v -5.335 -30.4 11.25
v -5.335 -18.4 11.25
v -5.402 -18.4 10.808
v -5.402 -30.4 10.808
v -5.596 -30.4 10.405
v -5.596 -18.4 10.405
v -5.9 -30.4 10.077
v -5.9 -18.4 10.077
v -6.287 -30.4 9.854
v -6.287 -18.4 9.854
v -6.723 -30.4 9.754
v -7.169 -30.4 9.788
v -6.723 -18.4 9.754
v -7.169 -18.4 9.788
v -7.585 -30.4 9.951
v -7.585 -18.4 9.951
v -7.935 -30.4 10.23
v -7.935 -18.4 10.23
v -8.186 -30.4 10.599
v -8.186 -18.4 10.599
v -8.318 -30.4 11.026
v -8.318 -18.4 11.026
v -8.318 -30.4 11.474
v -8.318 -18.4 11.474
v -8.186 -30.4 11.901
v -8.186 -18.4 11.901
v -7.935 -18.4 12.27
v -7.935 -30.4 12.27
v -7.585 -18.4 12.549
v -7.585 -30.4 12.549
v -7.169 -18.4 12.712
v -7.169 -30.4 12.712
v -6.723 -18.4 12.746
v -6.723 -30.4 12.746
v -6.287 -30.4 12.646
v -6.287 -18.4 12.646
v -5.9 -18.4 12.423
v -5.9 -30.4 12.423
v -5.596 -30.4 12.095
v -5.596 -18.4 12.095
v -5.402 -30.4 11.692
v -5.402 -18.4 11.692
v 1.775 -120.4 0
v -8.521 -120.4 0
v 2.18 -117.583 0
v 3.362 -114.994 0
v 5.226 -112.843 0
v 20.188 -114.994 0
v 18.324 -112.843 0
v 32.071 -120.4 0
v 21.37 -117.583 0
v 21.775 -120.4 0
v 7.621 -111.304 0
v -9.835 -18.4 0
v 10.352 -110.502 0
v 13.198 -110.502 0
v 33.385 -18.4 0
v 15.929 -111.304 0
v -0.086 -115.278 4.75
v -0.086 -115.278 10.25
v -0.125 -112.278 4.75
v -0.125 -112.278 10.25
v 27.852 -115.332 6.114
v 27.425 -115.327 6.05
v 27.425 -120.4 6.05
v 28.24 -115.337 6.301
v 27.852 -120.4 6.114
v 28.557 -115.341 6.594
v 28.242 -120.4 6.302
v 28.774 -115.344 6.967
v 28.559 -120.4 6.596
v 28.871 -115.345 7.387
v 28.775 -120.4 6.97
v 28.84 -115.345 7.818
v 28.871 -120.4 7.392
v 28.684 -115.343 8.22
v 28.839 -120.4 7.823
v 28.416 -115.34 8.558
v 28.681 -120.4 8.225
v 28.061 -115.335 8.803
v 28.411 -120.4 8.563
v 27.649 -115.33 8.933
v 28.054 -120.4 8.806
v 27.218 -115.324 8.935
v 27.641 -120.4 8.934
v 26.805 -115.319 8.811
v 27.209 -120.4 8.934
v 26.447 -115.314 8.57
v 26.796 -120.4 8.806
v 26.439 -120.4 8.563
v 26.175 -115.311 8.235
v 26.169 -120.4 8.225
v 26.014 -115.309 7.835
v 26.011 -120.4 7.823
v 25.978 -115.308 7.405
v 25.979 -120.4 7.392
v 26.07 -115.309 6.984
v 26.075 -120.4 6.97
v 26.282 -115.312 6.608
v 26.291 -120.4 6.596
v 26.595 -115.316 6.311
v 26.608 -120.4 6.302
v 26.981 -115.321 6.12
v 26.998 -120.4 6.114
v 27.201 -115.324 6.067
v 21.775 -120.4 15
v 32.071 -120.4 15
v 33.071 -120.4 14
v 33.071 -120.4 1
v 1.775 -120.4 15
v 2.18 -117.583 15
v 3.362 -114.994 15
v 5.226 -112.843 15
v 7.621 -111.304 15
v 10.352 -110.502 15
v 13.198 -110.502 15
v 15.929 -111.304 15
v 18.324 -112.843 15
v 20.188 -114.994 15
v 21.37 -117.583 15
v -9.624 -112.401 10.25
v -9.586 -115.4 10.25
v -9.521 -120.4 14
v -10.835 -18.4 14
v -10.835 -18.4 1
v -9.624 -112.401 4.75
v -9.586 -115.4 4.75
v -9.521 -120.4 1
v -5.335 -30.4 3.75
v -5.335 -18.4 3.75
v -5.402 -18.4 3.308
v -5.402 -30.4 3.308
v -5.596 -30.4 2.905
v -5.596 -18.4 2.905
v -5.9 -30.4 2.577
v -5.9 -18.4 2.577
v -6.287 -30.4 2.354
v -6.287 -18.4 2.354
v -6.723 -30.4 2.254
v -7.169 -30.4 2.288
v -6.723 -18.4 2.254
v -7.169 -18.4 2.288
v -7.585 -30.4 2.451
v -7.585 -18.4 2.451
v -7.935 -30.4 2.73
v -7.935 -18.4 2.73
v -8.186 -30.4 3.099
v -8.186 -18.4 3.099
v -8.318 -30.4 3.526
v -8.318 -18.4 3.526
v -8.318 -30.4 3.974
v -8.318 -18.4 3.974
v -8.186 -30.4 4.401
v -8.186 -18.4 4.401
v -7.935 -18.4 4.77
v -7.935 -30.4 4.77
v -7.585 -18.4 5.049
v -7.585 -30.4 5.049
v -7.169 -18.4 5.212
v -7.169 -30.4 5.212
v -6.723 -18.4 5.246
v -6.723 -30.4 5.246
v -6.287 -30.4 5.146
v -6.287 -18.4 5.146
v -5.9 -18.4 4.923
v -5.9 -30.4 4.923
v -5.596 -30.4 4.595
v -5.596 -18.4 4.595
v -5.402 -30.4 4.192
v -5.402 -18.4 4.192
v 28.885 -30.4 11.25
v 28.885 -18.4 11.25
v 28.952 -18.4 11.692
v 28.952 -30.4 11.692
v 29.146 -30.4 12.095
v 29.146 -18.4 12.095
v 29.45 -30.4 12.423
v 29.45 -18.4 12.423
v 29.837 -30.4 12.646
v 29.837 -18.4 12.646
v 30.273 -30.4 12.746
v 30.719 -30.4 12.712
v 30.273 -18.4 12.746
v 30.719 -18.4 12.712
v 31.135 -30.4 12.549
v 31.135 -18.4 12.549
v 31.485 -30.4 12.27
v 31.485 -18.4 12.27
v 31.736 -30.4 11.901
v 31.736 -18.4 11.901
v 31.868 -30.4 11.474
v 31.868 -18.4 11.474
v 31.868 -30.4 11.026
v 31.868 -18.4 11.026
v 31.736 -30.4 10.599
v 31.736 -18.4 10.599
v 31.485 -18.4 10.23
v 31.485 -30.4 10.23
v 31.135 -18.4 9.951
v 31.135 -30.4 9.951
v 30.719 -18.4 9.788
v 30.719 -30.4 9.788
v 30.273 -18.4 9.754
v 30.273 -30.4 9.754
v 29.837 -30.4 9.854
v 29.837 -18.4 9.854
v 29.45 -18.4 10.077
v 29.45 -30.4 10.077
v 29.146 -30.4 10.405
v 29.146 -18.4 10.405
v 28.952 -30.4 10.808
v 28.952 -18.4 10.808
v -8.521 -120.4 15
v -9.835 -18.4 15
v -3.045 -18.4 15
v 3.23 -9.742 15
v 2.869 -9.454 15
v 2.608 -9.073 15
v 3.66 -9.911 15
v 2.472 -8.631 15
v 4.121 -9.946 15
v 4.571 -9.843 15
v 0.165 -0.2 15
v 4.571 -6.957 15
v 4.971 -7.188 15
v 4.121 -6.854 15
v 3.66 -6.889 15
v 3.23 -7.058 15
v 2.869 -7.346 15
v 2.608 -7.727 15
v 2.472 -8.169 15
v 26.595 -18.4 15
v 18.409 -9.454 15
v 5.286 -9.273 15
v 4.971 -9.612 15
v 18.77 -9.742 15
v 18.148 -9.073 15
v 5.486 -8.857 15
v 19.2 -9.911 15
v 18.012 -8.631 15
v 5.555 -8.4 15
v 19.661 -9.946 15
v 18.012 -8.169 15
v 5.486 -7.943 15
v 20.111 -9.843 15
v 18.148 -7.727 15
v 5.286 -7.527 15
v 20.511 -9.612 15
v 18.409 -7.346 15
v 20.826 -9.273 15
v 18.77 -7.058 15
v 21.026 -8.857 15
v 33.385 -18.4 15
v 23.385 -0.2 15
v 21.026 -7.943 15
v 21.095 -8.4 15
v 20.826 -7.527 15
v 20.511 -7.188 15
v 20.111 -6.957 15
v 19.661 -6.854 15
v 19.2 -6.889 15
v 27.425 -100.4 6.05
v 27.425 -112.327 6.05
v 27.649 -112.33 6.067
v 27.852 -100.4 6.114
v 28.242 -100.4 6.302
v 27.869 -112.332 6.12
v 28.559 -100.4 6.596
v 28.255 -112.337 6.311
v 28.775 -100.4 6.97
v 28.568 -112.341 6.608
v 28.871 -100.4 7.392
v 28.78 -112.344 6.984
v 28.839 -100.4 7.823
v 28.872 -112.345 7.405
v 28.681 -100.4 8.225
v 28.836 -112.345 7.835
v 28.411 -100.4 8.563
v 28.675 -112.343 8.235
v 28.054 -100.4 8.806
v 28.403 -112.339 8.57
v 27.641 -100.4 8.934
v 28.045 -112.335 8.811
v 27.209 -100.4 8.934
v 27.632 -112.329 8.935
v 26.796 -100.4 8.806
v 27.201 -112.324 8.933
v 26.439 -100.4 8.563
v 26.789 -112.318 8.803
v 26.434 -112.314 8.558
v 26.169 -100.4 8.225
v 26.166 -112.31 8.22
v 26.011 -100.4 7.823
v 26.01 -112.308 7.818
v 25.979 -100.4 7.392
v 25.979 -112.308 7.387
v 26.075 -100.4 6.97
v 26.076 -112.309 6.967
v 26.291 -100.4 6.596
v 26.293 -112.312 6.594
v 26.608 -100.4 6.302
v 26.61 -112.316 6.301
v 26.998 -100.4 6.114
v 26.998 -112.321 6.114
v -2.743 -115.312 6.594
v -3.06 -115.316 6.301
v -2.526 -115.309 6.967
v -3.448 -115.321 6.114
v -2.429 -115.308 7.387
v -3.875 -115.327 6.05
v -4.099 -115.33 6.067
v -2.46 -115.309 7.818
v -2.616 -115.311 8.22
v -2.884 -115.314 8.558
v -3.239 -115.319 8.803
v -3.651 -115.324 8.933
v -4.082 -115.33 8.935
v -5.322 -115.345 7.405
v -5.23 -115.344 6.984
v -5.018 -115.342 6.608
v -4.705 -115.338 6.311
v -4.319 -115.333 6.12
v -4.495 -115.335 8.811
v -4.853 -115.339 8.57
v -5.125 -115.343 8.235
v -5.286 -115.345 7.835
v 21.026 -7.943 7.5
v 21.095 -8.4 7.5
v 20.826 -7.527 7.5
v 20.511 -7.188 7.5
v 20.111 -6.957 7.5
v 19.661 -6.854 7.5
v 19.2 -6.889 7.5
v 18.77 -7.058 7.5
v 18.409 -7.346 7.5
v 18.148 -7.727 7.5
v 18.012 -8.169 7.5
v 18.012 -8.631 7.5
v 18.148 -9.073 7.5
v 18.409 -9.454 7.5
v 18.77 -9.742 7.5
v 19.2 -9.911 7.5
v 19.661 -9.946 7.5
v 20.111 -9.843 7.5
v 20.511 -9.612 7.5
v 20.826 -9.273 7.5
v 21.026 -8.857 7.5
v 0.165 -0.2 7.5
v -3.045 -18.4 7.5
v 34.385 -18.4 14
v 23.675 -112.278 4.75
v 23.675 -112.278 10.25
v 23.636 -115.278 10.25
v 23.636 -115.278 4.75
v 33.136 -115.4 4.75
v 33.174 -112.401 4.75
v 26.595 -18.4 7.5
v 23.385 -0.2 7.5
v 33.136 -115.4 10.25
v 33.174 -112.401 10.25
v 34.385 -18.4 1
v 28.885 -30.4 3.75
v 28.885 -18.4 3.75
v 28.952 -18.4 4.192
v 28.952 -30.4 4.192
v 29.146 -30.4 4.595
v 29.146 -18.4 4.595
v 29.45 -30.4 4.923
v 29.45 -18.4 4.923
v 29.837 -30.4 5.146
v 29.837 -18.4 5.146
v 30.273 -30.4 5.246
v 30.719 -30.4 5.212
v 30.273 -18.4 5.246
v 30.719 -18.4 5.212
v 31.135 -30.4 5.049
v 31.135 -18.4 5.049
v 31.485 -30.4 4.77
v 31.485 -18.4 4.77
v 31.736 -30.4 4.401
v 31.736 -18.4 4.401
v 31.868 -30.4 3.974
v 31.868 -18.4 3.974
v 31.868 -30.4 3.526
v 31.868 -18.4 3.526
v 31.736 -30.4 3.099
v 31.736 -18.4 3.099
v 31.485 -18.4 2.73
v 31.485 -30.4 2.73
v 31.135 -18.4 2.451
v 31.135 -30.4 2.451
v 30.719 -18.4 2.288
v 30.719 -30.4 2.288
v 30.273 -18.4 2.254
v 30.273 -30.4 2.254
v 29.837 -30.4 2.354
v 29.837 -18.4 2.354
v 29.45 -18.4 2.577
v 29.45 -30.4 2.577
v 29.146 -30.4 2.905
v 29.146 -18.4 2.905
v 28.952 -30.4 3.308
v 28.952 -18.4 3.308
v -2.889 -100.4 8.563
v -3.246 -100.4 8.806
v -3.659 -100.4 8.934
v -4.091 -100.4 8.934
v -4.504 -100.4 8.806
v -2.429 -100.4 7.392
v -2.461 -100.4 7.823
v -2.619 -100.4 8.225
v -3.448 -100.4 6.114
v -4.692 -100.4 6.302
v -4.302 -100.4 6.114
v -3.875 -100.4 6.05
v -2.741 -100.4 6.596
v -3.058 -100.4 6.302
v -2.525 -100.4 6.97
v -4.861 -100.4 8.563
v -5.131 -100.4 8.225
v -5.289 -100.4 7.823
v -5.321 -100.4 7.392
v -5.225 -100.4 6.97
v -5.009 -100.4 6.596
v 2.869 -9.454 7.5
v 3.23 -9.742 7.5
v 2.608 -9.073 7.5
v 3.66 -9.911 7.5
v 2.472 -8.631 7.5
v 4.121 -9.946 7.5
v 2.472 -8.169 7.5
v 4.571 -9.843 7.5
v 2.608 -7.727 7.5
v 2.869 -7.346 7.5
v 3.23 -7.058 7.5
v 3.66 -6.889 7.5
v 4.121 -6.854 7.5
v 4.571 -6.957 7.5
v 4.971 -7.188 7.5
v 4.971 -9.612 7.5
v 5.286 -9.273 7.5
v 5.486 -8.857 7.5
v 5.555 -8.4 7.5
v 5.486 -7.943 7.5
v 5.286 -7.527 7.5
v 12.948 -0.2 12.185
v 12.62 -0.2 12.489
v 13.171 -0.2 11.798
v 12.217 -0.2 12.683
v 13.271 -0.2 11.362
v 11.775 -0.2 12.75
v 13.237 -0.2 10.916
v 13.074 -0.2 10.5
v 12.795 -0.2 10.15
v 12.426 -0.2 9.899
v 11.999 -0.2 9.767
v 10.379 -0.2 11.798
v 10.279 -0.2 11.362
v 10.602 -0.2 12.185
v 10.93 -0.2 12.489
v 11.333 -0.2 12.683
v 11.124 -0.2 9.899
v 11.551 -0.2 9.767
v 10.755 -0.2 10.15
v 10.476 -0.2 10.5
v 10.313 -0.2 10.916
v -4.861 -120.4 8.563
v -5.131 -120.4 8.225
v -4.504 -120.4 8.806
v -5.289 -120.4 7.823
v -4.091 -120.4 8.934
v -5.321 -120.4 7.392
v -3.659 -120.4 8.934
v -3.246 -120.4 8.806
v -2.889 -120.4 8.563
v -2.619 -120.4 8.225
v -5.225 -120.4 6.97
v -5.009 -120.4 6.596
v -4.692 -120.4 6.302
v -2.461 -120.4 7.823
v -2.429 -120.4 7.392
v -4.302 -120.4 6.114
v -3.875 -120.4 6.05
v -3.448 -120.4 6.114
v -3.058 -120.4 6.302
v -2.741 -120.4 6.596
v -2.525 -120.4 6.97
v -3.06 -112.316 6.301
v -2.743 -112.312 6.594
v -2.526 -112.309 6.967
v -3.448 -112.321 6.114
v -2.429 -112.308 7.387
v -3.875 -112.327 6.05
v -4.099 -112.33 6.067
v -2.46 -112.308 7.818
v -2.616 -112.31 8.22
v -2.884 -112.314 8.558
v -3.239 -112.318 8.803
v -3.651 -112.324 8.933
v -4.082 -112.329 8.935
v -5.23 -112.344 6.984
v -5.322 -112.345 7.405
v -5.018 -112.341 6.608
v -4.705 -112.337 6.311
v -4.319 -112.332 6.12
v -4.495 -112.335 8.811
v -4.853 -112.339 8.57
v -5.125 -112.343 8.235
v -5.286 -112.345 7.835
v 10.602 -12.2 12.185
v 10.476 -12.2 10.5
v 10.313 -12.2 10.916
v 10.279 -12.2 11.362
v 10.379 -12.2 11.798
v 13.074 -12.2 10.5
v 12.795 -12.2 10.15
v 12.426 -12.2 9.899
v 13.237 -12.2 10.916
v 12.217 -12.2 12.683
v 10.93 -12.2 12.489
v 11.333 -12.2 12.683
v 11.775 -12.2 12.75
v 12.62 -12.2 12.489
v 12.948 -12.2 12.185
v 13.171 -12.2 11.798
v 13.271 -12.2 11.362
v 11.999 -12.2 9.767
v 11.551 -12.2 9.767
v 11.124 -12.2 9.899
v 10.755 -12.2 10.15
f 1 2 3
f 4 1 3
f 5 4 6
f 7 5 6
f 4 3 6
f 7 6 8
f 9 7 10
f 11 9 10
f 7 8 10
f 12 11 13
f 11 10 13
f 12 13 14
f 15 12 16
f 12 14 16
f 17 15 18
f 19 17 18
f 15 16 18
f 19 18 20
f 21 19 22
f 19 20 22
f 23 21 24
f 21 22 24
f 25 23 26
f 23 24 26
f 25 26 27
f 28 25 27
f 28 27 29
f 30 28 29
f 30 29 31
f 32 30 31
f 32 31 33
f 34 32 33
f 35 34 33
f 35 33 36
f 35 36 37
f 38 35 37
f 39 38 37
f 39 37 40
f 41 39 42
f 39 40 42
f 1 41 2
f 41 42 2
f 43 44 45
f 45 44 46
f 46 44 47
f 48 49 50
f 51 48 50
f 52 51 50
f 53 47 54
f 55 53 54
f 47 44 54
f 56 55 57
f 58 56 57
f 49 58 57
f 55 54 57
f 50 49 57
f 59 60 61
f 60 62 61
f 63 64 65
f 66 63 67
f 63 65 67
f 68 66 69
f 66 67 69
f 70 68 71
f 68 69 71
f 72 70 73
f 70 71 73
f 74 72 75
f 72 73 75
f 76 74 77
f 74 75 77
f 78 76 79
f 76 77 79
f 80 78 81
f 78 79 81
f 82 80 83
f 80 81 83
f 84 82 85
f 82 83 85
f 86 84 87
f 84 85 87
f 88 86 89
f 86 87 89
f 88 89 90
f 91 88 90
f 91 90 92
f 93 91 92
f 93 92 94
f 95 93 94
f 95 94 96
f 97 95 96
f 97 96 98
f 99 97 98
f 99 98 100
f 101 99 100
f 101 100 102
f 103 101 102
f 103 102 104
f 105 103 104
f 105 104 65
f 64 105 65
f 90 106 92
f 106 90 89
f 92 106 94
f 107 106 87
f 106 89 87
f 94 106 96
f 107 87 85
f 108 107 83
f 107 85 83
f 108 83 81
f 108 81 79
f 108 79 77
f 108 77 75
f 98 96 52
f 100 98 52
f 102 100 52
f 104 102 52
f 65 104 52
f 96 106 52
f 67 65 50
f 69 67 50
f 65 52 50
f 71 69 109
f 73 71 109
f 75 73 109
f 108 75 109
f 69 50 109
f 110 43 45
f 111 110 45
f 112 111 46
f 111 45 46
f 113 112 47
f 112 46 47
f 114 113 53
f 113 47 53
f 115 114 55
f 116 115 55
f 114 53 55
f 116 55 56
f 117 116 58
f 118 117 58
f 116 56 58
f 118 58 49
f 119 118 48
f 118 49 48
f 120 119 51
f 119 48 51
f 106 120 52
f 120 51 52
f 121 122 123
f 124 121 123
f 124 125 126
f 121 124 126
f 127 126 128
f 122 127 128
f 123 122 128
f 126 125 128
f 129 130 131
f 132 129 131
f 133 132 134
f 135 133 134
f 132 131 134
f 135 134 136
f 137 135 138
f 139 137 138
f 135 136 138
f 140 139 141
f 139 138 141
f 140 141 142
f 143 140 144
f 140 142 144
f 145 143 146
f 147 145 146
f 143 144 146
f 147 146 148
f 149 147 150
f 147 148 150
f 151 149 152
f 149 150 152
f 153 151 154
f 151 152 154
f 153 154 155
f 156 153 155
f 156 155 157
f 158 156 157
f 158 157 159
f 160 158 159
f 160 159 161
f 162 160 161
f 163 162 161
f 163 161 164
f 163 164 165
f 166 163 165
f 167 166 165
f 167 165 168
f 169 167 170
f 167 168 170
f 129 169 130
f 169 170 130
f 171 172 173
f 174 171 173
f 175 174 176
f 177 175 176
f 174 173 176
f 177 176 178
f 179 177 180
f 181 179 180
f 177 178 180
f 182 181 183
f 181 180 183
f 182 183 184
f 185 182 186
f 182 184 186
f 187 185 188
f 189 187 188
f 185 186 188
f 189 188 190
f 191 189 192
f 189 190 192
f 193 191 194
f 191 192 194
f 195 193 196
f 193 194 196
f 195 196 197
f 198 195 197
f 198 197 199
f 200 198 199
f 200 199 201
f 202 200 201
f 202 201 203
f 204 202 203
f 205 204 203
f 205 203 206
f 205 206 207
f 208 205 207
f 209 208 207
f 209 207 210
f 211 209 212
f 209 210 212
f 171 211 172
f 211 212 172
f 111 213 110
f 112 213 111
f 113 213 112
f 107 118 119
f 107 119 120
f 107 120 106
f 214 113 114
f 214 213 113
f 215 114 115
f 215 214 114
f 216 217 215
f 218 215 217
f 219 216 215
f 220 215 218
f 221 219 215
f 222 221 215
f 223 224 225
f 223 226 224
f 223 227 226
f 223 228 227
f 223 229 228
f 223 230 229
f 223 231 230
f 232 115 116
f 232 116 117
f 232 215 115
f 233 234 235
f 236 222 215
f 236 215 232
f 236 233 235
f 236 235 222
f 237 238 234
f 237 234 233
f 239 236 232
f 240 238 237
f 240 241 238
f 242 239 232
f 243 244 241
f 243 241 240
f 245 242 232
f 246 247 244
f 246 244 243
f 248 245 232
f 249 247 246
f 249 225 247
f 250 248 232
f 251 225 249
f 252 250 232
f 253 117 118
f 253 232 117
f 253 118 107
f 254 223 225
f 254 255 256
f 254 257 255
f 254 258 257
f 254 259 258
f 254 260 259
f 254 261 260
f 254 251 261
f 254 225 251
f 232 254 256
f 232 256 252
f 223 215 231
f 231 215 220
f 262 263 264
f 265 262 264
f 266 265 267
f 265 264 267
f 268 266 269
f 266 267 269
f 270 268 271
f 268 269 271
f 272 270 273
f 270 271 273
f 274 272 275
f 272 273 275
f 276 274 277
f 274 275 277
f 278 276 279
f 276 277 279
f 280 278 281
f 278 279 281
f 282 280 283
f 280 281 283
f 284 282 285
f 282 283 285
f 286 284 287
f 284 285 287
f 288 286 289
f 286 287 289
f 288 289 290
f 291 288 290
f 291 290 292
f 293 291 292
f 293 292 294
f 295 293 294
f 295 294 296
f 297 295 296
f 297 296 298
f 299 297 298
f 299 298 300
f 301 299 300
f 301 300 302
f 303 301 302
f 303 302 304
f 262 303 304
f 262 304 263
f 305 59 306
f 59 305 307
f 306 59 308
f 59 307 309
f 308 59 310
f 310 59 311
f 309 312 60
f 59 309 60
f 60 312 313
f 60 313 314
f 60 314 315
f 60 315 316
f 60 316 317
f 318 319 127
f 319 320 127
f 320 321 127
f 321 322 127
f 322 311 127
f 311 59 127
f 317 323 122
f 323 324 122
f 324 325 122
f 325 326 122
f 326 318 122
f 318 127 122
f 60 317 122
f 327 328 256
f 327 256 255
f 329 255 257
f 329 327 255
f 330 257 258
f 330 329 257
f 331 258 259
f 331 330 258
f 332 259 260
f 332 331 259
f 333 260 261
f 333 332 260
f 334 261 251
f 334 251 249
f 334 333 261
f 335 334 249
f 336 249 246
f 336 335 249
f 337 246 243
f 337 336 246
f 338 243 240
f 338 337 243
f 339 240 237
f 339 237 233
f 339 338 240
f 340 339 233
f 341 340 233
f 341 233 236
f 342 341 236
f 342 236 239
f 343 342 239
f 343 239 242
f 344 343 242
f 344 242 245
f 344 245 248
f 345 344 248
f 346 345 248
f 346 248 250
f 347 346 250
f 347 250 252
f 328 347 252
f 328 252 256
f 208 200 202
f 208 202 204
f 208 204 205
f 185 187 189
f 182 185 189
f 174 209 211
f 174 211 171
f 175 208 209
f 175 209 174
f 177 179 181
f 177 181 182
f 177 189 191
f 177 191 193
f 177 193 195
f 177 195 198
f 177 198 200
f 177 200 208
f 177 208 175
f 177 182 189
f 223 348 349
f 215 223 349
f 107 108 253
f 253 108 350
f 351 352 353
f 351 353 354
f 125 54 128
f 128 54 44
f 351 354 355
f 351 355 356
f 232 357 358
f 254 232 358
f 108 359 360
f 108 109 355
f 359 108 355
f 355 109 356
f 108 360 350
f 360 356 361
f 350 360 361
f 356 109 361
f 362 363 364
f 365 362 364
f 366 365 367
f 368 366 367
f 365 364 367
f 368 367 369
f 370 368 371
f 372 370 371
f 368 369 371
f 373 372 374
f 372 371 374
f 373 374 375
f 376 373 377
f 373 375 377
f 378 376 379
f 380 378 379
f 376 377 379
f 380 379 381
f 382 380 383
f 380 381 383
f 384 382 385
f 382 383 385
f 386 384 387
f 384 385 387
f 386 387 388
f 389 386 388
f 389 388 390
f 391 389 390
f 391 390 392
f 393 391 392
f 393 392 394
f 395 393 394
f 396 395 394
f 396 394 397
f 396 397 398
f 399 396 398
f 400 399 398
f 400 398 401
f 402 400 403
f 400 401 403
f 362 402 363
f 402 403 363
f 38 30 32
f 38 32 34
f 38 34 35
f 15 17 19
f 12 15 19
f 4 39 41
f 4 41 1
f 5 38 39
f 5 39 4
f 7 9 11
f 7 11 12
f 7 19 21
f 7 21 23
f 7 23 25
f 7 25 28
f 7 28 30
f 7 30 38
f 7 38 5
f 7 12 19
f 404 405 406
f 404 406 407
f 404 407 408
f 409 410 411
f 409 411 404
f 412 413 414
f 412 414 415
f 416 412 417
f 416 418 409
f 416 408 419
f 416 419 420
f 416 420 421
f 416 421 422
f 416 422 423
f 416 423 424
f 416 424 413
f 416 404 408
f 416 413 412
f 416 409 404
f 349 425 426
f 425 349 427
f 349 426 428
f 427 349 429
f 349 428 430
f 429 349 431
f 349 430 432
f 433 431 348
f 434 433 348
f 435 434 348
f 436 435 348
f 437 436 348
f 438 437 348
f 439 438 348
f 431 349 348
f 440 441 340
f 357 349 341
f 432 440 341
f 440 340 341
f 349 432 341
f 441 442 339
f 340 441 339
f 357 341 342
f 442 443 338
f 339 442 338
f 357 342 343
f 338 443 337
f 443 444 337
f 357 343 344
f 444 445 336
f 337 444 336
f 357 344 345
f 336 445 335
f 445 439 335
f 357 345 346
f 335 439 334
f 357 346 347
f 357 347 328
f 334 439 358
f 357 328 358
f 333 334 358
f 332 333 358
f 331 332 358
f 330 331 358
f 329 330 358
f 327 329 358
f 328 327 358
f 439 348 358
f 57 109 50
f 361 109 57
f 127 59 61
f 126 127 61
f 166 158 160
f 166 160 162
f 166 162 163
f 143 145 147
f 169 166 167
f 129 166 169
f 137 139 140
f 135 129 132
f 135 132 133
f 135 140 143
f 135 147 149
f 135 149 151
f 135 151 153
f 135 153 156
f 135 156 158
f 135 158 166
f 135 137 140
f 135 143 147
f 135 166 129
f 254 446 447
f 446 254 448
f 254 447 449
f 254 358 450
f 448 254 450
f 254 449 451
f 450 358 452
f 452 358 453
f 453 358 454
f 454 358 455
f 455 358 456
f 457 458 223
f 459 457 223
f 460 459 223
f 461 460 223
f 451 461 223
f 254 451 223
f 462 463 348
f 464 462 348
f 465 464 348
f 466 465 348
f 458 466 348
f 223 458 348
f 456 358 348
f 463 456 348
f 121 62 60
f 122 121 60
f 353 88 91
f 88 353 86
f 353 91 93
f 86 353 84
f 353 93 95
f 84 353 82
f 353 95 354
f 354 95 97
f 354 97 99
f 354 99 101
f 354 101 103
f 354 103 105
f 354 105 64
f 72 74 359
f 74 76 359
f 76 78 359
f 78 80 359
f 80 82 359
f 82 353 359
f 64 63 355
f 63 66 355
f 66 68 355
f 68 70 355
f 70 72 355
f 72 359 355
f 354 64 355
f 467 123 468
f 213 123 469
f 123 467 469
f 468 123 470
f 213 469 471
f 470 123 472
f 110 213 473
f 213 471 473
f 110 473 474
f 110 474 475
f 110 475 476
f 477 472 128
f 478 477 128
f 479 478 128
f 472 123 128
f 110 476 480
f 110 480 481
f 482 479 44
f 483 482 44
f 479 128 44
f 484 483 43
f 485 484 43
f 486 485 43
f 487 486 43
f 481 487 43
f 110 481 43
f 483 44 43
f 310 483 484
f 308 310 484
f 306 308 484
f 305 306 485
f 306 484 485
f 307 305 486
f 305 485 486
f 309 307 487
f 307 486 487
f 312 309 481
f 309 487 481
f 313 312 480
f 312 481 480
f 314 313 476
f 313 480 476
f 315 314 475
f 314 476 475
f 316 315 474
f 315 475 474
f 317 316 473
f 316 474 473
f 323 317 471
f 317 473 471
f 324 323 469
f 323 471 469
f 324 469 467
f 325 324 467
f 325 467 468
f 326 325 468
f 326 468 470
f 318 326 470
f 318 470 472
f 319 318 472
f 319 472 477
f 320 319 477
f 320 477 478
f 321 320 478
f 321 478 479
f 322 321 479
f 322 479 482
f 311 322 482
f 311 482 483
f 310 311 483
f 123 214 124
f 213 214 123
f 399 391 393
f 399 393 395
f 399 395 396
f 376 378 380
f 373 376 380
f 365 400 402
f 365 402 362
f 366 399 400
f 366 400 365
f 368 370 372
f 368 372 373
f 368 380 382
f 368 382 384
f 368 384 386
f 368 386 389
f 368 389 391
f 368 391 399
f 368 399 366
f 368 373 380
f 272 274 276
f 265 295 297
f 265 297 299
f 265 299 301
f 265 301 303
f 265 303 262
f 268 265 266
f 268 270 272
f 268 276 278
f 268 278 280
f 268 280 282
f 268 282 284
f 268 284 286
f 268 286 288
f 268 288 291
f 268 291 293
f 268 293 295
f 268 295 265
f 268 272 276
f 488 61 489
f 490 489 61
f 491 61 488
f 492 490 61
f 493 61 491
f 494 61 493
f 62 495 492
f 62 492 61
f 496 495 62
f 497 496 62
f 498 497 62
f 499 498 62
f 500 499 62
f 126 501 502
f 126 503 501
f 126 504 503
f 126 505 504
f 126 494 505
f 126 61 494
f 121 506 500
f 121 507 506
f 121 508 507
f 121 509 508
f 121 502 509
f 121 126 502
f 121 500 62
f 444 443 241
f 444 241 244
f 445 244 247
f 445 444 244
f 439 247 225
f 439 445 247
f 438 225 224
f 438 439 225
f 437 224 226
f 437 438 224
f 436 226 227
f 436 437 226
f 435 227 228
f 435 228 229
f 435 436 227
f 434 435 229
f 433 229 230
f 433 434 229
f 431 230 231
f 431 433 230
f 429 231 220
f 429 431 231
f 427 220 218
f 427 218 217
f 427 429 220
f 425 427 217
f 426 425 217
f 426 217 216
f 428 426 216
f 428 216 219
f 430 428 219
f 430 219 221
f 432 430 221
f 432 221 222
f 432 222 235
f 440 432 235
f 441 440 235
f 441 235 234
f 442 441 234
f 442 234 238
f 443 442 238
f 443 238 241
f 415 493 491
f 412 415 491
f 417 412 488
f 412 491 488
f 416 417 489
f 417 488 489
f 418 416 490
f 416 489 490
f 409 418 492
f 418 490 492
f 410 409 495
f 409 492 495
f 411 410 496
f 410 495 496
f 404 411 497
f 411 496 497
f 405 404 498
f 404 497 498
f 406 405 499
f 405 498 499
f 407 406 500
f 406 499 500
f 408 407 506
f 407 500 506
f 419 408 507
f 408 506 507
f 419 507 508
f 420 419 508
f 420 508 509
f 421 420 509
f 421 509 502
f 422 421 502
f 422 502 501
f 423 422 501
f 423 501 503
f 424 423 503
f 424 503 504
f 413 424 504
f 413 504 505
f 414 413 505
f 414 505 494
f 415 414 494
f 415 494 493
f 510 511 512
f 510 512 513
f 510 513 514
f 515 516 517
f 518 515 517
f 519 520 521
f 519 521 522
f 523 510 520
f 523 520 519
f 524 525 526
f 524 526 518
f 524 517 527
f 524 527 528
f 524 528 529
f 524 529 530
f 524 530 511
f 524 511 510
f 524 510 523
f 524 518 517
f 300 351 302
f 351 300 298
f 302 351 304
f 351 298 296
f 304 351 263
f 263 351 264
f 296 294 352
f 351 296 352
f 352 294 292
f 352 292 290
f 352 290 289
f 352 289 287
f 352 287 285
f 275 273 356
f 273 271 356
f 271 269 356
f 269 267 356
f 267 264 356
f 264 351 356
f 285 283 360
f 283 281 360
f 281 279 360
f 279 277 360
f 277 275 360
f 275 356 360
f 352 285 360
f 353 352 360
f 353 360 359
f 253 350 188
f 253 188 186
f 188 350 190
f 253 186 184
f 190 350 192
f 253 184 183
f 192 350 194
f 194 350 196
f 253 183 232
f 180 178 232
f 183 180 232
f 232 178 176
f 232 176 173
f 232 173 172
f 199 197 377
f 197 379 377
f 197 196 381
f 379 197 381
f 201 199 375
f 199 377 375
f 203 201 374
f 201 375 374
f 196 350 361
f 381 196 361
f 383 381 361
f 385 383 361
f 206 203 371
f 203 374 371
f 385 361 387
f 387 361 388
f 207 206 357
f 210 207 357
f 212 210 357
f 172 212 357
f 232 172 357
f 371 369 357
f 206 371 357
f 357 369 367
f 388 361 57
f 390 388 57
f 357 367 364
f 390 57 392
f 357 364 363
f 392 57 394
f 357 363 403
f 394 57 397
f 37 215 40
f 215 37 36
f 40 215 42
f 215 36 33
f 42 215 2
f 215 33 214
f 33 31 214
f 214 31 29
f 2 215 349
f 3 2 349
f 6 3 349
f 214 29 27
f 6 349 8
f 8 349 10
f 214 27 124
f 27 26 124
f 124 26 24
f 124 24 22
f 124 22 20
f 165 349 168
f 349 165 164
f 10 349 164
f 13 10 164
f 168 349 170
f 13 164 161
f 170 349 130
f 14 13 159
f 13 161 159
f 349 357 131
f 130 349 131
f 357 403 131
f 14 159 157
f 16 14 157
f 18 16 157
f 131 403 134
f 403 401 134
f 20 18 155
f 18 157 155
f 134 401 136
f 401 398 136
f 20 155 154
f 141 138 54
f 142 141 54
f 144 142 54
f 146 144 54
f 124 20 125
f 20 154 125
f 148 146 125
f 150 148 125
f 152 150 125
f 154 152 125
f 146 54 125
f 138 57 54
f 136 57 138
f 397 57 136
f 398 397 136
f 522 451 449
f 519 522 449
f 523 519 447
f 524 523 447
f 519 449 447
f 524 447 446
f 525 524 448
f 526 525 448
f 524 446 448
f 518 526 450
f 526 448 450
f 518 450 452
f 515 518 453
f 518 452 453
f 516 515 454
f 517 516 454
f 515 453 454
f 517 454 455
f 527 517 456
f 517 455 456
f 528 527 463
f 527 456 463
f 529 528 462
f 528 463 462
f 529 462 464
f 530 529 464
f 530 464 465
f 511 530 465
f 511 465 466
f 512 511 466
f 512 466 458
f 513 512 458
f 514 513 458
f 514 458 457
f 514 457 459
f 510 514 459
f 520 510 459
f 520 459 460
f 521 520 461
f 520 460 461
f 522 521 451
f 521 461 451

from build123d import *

# Parameters (mm, degrees)
SKETCH_1_R          = 1.55
EXTRUDE_1_DEPTH     = 15
CUT_EXTRUDE_1_DEPTH = 18.2
SKETCH_3_R          = 1.5
CUT_EXTRUDE_2_DEPTH = 12
SKETCH_4_R          = 1.5
CUT_EXTRUDE_3_DEPTH = 12
CHAMFER_1_SIZE      = 1
CUT_EXTRUDE_4_DEPTH = 9.5
CUT_EXTRUDE_5_DEPTH = 9.5
SKETCH_7_R          = 1.45
CUT_EXTRUDE_6_DEPTH = 20


with BuildPart() as part:
    # 草图1 → 凸台-拉伸1 (new body)
    with BuildSketch(Plane.XY):
        with BuildLine():
            Line((-10.835, -18.4), (-9.52124, -120.4))
            Line((-9.52124, -120.4), (1.775, -120.4))
            ThreePointArc((1.775, -120.4), (11.775, -110.4), (21.775, -120.4))
            Line((21.775, -120.4), (33.07124, -120.4))
            Line((33.07124, -120.4), (34.385, -18.4))
            Line((34.385, -18.4), (26.795, -18.4))
            Line((26.795, -18.4), (26.595, -18.4))
            Line((26.595, -18.4), (23.385271739, -0.2))
            Line((23.385271739, -0.2), (0.164728261, -0.2))
            Line((0.164728261, -0.2), (-3.045, -18.4))
            Line((-3.045, -18.4), (-3.245, -18.4))
            Line((-3.245, -18.4), (-10.835, -18.4))
        make_face()
        with Locations((4.005, -8.4)):
            Circle(SKETCH_1_R, mode=Mode.SUBTRACT)
        with Locations((19.545, -8.4)):
            Circle(SKETCH_1_R, mode=Mode.SUBTRACT)
    extrude(amount=EXTRUDE_1_DEPTH)

    # 草图2 → 切除-拉伸1 (cut)
    with BuildSketch(Plane(origin=(0, -0.2, 0), x_dir=(1, 0, 0), z_dir=(0, 1, 0))):
        Polygon((23.385271739, -7.5), (-22.23859784, -7.5), (-22.23859784, 0), (39.198950906, 0), (39.198950906, -7.5), align=None)
    extrude(amount=-CUT_EXTRUDE_1_DEPTH, mode=Mode.SUBTRACT)

    # 草图3 → 切除-拉伸2 (cut)
    with BuildSketch(Plane(origin=(0, -0.2, 0), x_dir=(1, 0, 0), z_dir=(0, 1, 0))):
        with Locations(Location((11.775, -11.25, 0), (0, 0, 270))):
            Circle(SKETCH_3_R)
    extrude(amount=-CUT_EXTRUDE_2_DEPTH, mode=Mode.SUBTRACT)

    # 草图4 → 切除-拉伸3 (cut)
    with BuildSketch(Plane(origin=(0, -18.4, 0), x_dir=(1, 0, 0), z_dir=(0, 1, 0))):
        with Locations(Location((30.385, -3.75, 0), (0, 0, 180))):
            Circle(SKETCH_4_R)
        with Locations(Location((30.385, -11.25, 0), (0, 0, 180))):
            Circle(SKETCH_4_R)
        with Locations((-6.835, -11.25)):
            Circle(SKETCH_4_R)
        with Locations((-6.835, -3.75)):
            Circle(SKETCH_4_R)
    extrude(amount=-CUT_EXTRUDE_3_DEPTH, mode=Mode.SUBTRACT)

    # 倒角1
    chamfer_1_edges = [part.edges().sort_by_distance(p)[0] for p in [
        (33.72812, -69.4, 15),
        (-10.17812, -69.4, 0),
        (33.72812, -69.4, 0),
        (-10.17812, -69.4, 15),
    ]]
    chamfer(chamfer_1_edges, length=CHAMFER_1_SIZE)

    # 草图5 → 切除-拉伸4 (cut)
    with BuildSketch(Plane(origin=(34.616249358, -0.445857292, 0), x_dir=(0, 0, -1), z_dir=(0.9999170631189305, -0.012878931772971664, 0))):
        Polygon((-7.5, -114.964092156), (-4.75, -114.964092156), (-4.75, -111.964092156), (-10.25, -111.964092156), (-10.25, -114.964092156), align=None)
    extrude(amount=-CUT_EXTRUDE_4_DEPTH, mode=Mode.SUBTRACT)

    # 草图6 → 切除-拉伸5 (cut)
    with BuildSketch(Plane(origin=(-11.070155523, -0.142583603, 0), x_dir=(0, 0, 1), z_dir=(-0.9999170631189305, -0.012878931772971934, 0))):
        Polygon((7.5, -115.267390999), (4.75, -115.267390999), (4.75, -112.267390999), (10.25, -112.267390999), (10.25, -115.267390999), align=None)
    extrude(amount=-CUT_EXTRUDE_5_DEPTH, mode=Mode.SUBTRACT)

    # 草图7 → 切除-拉伸6 (cut)
    with BuildSketch(Plane.XZ.offset(120.4)):
        with Locations(Location((27.425, 7.5, 0), (0, 0, 270))):
            Circle(SKETCH_7_R)
        with Locations(Location((-3.875, 7.5, 0), (0, 0, 270))):
            Circle(SKETCH_7_R)
    extrude(amount=-CUT_EXTRUDE_6_DEPTH, mode=Mode.SUBTRACT)


solid = part.part
